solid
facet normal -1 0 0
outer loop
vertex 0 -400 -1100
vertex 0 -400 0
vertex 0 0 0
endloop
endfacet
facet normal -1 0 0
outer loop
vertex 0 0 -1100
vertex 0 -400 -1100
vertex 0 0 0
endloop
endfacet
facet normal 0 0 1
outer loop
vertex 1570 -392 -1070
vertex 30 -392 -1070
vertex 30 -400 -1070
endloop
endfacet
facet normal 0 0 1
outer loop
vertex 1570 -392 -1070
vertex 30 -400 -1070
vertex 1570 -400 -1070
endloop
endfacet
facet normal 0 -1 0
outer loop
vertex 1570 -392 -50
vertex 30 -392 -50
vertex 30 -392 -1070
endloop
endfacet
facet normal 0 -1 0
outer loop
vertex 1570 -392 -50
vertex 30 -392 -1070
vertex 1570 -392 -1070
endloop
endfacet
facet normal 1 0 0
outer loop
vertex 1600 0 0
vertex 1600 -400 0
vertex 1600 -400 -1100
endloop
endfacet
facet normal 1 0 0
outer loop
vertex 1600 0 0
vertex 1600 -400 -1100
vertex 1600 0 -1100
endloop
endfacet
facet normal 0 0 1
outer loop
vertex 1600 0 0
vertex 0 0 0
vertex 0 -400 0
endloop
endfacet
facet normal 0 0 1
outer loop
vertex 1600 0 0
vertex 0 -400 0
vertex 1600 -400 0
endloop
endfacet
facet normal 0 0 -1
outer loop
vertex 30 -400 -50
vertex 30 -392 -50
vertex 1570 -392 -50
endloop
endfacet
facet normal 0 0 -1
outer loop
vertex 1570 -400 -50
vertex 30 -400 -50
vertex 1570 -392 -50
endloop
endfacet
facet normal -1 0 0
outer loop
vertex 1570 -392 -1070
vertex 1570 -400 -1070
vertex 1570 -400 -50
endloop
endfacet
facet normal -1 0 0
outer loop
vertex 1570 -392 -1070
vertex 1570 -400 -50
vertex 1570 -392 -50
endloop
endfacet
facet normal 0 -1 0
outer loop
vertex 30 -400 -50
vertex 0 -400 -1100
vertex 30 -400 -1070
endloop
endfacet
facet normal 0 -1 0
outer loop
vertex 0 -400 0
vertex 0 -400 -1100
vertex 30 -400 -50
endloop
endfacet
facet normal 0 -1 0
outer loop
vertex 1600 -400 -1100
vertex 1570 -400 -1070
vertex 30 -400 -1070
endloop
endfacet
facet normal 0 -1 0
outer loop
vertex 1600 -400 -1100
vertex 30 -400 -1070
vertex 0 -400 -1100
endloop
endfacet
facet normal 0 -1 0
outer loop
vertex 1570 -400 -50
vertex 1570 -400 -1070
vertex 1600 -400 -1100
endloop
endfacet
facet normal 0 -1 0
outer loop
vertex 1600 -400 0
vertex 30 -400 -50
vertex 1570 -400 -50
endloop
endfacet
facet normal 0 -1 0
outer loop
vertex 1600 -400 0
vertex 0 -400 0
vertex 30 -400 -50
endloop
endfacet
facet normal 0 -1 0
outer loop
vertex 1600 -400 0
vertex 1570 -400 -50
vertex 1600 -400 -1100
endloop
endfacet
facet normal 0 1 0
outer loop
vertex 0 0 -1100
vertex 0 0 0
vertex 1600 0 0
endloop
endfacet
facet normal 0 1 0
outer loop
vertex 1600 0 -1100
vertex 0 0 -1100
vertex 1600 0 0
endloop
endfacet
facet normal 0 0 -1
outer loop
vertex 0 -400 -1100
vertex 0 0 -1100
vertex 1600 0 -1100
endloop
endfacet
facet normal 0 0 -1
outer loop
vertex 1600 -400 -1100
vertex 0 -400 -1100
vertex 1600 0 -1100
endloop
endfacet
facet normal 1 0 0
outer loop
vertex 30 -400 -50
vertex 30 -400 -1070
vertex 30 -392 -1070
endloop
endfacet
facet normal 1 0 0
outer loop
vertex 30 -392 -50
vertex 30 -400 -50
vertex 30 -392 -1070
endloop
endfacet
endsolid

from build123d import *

# Parameters (mm, degrees)
F0_W     = 1600
F0_H     = 400
F1_DEPTH = 1100
F3_START = -50
F2_W     = 1540
F2_H     = 8
F3_DEPTH = 1020


with BuildPart() as f1:
    # F0 (on Top) → F1 (new body)
    with BuildSketch(Plane.XY):
        with Locations((800, -200)):
            Rectangle(F0_W, F0_H)
    extrude(amount=-F1_DEPTH)

    # F2 (on face) → F3 (cut)
    with BuildSketch(Plane.XY.offset(F3_START)):
        with Locations((800, -396)):
            Rectangle(F2_W, F2_H)
    extrude(amount=-F3_DEPTH, mode=Mode.SUBTRACT)


solid = f1.part
